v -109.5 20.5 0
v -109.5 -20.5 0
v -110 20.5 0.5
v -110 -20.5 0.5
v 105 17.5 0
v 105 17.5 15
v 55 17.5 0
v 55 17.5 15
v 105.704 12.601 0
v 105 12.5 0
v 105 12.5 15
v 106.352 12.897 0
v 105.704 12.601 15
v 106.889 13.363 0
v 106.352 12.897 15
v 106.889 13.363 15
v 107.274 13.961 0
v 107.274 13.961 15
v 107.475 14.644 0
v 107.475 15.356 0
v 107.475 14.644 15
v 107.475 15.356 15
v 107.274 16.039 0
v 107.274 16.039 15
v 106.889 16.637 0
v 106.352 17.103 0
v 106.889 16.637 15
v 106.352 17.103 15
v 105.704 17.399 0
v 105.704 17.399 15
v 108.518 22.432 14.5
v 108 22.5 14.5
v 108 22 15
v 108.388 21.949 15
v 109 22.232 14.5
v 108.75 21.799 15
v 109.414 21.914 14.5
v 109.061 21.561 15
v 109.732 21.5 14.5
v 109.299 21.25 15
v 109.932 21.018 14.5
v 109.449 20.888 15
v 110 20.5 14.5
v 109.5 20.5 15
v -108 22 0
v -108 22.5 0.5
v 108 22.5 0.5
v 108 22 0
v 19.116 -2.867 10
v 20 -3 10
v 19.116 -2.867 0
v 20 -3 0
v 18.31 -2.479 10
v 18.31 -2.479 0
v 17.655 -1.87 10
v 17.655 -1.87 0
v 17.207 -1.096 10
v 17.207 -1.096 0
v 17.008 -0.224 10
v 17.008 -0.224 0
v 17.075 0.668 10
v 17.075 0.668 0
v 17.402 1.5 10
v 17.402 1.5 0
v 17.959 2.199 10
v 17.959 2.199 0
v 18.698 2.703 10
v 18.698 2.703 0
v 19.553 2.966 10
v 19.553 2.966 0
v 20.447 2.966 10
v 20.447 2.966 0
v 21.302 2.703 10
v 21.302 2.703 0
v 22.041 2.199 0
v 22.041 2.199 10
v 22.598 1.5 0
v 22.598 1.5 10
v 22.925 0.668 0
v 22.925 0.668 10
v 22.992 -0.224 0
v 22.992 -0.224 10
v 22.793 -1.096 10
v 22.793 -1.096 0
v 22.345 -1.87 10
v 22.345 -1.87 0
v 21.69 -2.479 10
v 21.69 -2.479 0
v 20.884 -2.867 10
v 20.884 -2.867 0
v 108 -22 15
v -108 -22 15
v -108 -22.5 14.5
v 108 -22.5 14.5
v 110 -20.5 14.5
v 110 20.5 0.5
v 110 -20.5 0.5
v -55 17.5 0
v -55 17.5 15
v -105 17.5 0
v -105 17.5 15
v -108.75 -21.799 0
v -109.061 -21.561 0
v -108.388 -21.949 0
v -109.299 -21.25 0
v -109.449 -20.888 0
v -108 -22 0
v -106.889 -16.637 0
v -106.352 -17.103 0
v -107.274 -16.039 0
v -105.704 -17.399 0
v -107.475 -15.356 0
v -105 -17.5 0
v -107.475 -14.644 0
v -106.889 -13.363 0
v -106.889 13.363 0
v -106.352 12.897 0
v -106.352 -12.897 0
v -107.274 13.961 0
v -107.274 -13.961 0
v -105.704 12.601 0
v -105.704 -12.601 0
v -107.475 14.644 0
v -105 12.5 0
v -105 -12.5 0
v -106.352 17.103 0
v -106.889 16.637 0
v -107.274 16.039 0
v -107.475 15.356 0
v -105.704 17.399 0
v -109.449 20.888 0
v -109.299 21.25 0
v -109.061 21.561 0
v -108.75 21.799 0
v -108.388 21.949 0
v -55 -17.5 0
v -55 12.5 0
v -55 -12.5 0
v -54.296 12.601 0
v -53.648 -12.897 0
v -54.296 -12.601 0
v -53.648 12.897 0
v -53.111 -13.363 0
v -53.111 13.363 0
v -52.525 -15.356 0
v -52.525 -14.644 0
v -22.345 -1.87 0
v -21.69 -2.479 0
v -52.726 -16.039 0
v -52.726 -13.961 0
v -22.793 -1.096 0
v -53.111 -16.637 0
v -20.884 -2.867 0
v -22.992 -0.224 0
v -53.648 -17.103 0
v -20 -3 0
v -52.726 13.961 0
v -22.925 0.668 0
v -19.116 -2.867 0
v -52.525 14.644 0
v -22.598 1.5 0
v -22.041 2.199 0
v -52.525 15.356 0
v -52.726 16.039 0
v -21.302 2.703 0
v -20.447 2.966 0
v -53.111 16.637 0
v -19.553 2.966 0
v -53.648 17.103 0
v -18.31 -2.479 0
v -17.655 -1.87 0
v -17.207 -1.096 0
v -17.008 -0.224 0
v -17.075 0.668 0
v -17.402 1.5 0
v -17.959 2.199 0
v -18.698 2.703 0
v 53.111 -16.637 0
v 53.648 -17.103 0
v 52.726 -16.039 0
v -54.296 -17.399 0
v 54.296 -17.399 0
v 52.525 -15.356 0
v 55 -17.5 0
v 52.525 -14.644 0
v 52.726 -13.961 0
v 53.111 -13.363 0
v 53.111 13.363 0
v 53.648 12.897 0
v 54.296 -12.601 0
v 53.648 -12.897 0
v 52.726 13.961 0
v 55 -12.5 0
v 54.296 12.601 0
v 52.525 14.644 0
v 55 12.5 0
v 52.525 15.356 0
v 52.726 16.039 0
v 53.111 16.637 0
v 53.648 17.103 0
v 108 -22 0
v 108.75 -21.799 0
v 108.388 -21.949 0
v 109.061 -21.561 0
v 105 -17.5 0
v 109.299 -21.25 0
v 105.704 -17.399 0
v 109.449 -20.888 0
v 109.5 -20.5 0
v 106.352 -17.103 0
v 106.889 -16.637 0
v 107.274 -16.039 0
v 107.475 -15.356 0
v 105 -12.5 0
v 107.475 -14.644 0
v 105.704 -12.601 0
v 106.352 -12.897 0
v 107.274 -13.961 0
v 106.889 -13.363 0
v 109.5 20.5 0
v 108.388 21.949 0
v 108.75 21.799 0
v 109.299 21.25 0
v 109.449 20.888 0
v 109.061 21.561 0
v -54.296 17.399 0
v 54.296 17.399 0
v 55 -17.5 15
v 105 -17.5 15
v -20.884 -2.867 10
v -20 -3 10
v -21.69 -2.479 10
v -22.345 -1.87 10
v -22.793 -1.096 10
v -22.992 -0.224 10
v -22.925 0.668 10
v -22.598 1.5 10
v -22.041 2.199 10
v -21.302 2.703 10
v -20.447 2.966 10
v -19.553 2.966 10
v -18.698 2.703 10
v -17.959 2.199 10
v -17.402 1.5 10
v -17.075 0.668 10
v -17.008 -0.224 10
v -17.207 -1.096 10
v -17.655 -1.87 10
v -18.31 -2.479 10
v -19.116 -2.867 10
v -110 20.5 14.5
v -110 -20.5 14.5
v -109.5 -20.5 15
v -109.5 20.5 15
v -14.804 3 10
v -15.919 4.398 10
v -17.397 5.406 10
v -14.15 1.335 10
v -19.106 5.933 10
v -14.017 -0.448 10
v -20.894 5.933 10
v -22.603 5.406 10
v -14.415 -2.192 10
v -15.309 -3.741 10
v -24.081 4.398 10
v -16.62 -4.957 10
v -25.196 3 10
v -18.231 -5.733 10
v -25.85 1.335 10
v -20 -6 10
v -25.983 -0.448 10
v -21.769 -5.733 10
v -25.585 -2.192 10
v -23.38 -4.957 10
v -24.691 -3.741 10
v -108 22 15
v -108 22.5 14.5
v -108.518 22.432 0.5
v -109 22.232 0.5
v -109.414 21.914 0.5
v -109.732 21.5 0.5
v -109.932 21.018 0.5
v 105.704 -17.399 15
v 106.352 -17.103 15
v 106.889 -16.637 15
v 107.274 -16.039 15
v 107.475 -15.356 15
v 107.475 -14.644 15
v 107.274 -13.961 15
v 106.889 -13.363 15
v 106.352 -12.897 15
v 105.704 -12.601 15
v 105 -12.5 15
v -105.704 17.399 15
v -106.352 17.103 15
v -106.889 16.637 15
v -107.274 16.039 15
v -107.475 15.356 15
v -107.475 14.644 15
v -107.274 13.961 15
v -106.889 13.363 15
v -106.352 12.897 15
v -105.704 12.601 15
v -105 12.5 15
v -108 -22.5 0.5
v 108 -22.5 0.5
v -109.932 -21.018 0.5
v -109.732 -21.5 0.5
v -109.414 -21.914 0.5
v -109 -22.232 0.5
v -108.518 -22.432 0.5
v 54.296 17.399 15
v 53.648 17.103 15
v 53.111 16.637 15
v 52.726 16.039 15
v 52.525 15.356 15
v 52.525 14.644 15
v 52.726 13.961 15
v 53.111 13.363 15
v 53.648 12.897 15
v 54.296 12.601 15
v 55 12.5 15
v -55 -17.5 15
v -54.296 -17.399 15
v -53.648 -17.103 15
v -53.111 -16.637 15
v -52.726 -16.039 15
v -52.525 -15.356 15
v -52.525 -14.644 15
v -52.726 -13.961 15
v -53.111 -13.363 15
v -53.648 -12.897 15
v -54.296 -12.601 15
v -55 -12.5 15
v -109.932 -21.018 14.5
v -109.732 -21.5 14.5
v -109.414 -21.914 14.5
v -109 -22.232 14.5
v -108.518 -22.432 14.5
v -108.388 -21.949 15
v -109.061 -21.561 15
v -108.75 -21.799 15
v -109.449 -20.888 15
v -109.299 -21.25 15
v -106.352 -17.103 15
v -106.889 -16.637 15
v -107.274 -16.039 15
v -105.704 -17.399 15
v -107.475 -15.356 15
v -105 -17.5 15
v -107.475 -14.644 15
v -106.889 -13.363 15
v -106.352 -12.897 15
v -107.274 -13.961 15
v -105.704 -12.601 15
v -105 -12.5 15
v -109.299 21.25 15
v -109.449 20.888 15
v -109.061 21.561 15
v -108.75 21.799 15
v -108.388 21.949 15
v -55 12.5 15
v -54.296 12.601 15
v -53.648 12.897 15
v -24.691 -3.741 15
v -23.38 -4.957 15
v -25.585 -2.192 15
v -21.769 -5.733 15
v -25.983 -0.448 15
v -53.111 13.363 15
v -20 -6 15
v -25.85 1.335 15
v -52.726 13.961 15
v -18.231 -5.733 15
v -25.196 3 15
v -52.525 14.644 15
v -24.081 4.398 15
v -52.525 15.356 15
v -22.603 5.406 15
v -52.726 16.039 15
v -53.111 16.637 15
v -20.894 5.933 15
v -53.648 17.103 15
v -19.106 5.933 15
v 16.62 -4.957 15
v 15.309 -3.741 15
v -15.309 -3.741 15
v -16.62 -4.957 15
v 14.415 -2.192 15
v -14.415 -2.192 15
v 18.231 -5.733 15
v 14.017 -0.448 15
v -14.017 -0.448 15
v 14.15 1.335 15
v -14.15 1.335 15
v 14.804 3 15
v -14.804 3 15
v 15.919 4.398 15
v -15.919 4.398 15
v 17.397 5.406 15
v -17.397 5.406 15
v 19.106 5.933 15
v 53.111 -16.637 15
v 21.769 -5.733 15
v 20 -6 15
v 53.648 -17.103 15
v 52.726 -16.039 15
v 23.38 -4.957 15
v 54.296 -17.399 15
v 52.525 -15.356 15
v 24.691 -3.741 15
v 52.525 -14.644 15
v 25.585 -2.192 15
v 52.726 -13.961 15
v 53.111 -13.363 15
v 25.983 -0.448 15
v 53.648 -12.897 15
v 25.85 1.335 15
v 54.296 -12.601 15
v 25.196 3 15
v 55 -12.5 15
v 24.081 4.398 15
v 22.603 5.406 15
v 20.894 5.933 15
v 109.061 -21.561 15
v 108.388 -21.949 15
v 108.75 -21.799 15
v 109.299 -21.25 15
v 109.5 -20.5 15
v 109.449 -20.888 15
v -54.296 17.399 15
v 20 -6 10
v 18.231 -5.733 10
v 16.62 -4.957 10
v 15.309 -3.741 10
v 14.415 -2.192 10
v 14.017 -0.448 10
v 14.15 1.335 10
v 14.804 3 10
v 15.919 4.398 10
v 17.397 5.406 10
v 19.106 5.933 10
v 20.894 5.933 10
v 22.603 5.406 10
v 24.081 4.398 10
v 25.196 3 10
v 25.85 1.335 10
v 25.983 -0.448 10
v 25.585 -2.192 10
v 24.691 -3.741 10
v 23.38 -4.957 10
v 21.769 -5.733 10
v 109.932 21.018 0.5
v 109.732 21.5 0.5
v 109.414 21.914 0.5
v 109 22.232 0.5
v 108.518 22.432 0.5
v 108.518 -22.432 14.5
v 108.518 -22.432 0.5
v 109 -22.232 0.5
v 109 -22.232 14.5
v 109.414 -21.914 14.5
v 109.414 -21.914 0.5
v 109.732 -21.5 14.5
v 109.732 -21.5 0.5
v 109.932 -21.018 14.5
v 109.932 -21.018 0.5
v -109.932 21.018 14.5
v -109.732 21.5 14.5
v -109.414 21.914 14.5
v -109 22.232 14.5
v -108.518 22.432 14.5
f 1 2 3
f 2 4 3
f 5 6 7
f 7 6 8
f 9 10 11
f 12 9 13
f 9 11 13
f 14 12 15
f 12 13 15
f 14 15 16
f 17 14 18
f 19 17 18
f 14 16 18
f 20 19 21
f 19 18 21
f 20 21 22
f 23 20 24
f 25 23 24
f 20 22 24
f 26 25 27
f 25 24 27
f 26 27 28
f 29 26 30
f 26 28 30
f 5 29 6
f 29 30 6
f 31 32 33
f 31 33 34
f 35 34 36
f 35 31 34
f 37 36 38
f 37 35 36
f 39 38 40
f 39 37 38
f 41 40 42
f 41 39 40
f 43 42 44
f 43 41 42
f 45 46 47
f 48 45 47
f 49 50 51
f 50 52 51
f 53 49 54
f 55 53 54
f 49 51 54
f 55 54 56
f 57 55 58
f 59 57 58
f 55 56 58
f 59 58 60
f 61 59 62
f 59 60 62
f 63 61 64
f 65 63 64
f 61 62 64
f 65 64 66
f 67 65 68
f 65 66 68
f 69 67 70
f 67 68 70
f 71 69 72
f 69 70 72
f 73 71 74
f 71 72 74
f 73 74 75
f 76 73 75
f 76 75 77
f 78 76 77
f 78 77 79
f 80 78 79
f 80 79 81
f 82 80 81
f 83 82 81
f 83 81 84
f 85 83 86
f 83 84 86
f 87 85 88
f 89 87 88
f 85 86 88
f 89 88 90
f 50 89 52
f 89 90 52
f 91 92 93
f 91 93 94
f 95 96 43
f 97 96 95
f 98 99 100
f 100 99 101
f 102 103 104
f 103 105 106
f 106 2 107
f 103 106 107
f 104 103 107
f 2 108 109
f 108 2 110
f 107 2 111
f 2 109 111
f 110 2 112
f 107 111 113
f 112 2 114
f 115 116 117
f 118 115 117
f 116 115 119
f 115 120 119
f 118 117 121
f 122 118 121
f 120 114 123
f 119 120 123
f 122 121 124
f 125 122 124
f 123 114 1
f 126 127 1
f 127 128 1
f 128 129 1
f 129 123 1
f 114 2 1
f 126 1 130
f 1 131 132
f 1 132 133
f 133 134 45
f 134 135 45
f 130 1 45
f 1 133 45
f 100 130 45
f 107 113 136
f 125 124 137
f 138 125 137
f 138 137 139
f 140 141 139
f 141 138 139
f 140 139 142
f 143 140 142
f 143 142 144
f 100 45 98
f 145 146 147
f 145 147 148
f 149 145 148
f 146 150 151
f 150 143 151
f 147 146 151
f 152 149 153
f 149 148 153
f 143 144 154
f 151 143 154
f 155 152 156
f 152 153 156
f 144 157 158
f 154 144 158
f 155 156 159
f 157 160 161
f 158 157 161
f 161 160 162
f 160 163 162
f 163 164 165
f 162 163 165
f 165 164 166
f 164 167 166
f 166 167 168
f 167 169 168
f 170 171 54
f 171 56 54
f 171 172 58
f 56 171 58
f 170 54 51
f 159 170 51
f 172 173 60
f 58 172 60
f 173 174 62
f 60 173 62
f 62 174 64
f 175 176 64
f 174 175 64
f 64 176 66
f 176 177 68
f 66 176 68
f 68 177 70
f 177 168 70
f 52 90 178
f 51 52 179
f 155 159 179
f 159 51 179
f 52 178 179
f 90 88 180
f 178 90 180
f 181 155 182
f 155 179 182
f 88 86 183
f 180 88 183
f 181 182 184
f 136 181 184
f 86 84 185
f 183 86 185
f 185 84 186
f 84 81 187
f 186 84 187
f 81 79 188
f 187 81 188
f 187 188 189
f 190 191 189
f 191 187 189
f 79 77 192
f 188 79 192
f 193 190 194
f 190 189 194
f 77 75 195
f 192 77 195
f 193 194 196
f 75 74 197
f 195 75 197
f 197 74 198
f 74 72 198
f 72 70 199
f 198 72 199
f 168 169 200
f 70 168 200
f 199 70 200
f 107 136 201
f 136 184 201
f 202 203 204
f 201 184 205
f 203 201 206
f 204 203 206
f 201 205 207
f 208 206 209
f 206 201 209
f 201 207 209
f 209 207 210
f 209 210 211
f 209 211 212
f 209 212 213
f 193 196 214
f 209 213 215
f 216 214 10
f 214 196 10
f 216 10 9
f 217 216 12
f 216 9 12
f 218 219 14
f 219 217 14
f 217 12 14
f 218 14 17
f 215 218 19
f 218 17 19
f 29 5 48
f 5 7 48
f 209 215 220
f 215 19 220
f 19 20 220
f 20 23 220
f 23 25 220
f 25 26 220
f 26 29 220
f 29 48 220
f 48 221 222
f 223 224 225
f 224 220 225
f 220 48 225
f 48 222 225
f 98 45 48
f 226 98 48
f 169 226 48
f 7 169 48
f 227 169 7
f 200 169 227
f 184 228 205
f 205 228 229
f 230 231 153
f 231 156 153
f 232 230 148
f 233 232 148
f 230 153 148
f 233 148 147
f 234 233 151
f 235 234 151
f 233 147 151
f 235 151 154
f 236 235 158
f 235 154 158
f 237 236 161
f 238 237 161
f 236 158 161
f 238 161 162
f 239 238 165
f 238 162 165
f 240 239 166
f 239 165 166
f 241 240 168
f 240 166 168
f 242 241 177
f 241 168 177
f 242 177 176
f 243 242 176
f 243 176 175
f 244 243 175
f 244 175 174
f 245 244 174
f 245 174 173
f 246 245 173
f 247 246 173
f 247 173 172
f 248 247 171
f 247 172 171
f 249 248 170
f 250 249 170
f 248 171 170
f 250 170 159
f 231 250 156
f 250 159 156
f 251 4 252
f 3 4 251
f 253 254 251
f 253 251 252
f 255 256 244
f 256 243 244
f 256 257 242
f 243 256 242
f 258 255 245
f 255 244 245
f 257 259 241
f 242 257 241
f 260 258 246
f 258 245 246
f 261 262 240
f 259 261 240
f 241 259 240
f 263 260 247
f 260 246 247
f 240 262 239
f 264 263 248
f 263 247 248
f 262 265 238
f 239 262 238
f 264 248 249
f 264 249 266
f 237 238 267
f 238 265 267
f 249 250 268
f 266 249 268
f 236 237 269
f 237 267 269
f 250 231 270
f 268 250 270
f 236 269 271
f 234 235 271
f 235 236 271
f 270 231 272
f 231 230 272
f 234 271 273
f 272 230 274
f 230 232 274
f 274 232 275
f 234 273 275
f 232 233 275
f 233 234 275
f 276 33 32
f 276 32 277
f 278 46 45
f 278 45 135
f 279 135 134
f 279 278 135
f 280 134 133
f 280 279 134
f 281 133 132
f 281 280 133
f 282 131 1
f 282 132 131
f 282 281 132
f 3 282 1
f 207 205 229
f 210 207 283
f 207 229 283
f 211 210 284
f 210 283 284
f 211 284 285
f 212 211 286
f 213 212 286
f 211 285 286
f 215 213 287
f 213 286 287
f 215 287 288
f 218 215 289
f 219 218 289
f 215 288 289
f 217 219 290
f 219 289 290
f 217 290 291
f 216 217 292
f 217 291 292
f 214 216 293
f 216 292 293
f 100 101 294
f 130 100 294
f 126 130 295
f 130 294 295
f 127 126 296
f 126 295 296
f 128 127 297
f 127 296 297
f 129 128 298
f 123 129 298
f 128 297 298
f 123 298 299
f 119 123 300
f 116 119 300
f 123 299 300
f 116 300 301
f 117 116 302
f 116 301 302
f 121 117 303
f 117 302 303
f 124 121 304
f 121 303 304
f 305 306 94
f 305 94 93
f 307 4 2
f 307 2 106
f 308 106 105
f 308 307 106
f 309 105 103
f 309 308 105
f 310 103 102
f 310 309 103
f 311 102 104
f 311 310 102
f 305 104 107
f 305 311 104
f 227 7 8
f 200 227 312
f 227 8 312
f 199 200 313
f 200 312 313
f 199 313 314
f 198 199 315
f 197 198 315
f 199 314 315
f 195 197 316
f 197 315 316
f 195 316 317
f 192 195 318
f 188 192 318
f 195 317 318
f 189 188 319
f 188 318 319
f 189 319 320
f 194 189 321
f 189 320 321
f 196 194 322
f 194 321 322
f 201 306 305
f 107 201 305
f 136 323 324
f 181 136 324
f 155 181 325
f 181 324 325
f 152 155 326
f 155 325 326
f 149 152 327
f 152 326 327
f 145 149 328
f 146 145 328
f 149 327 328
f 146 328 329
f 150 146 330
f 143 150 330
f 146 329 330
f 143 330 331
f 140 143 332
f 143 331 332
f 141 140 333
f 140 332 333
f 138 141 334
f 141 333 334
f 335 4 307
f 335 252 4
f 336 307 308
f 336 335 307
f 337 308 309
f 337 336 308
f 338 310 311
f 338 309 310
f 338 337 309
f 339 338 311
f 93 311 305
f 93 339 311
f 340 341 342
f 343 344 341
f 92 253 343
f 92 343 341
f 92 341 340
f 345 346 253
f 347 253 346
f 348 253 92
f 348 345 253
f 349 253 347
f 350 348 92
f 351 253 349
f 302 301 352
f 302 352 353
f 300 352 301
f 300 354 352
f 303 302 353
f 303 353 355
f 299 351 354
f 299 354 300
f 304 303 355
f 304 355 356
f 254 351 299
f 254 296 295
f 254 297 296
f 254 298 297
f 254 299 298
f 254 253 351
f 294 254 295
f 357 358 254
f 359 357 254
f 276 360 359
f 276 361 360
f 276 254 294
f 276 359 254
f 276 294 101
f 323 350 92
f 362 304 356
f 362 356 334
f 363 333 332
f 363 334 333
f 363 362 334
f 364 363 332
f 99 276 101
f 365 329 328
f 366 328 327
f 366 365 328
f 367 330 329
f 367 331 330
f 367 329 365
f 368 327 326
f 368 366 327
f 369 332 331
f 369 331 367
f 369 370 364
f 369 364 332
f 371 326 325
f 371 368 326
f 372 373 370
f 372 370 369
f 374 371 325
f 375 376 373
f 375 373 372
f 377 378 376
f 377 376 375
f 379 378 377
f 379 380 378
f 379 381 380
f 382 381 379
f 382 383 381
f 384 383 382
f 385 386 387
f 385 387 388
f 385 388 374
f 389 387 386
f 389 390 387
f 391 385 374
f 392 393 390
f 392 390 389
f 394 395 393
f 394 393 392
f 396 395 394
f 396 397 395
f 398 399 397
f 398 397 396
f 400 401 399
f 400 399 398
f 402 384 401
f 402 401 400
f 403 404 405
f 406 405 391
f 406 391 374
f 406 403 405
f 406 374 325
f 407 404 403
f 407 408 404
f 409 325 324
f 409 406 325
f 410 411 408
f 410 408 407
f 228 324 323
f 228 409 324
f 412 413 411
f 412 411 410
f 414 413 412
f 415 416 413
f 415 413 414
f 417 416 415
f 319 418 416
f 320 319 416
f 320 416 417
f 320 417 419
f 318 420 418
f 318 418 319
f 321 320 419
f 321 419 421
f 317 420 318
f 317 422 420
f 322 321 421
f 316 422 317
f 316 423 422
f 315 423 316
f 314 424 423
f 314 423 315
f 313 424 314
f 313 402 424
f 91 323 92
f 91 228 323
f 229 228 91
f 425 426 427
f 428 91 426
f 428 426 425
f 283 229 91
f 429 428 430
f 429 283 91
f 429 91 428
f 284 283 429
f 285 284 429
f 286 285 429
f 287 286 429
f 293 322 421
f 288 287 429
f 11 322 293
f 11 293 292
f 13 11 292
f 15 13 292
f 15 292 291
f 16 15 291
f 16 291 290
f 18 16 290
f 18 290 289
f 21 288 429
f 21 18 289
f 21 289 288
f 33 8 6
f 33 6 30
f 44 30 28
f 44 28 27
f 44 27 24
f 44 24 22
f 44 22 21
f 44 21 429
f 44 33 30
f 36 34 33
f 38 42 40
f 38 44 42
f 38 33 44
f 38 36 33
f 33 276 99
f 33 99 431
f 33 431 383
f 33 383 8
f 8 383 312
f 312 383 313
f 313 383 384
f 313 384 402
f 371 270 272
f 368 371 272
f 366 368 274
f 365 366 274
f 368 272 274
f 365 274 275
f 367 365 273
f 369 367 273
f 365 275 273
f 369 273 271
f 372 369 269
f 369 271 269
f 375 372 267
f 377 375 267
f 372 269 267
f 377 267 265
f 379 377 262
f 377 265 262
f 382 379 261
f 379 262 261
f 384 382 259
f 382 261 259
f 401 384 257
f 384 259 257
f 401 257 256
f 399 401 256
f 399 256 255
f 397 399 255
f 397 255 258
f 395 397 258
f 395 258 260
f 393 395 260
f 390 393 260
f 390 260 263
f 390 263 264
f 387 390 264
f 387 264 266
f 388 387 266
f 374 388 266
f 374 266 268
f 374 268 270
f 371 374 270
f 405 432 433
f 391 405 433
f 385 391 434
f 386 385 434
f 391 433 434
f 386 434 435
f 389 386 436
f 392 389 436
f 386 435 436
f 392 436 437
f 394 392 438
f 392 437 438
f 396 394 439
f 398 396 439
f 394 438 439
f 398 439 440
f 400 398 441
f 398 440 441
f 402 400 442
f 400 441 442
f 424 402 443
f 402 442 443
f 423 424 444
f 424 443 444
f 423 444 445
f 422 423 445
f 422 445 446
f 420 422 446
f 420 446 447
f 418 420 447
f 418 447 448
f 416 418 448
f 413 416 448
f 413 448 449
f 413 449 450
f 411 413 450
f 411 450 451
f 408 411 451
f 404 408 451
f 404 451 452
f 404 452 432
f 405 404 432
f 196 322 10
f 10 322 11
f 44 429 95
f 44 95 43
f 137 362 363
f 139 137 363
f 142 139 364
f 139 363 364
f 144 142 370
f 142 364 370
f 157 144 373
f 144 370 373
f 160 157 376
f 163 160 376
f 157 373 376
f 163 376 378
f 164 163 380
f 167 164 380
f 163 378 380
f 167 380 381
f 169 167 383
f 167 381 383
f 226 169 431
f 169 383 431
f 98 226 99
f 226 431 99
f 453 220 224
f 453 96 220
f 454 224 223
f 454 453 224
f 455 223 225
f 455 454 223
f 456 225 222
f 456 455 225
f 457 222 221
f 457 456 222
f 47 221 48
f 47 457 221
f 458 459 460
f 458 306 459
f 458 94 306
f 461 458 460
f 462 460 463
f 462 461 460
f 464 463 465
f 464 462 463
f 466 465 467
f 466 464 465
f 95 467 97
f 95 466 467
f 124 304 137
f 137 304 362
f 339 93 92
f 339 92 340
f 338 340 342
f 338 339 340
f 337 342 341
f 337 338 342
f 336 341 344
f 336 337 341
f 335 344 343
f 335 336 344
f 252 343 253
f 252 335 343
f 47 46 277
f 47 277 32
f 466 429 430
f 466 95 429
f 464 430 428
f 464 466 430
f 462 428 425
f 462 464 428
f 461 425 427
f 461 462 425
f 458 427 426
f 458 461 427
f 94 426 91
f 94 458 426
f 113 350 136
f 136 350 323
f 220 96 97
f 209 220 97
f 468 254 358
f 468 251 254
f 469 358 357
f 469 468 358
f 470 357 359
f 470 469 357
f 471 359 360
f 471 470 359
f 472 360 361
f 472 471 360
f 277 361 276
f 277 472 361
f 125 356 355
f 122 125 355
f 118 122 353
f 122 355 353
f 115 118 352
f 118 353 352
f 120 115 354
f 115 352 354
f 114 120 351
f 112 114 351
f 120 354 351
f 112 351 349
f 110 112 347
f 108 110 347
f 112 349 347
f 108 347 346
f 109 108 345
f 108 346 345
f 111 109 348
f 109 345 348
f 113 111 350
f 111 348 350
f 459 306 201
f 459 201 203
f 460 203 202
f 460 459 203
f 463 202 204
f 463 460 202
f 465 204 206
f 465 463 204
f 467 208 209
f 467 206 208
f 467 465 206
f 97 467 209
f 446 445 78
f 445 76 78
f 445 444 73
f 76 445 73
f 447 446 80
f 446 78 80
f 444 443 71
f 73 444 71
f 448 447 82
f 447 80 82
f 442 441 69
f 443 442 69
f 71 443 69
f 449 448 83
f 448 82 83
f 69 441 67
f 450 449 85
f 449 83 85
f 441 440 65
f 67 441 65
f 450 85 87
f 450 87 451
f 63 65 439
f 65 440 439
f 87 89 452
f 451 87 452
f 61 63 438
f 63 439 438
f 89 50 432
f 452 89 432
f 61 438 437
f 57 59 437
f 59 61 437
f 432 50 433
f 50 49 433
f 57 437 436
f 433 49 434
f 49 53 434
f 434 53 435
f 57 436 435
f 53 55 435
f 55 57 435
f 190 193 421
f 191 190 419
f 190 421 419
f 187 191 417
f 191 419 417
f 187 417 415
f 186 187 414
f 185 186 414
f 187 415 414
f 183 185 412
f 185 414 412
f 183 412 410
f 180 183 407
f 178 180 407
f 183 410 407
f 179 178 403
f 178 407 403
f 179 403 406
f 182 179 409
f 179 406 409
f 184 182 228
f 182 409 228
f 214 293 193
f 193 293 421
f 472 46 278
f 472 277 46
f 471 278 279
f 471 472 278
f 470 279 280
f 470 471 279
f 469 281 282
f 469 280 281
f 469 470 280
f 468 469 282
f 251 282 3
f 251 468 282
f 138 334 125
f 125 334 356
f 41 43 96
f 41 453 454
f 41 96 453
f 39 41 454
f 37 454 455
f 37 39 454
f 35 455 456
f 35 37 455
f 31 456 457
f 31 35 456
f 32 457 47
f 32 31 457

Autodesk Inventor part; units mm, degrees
ref_plane "YZ Plane" through (0, 0, 0) normal (1, 0, 0) x (0, 1, 0)
ref_plane "XZ Plane" through (0, 0, 0) normal (0, 1, 0) x (-1, 0, 0)
ref_plane "XY Plane" through (0, 0, 0) normal (0, 0, 1) x (1, 0, 0)
sketch "Sketch1" plane through (0, 0, 0) normal (0, 0, 1) x (1, 0, 0)
  line L0 (-110, 22.5) -> (110, 22.5)
  line L1 (110, 22.5) -> (110, -22.5)
  line L2 (110, -22.5) -> (-110, -22.5)
  line L3 (-110, -22.5) -> (-110, 22.5)
  point P0 (0, 0)
  point P1 (110, 0)
  point P2 (0, 22.5)
  dimension "d0" = 220
  dimension "d1" = 45
extrude "Extrusion1" add sketch "Sketch1" along normal blind 15
sketch "Sketch2" plane through (0, 0, 15) normal (0, 0, 1) x (1, 0, 0)
  line L0 (-105, 15) -> (-55, 15) construction
  line L1 (-105, 12.5) -> (-55, 12.5)
  line L2 (-55, 17.5) -> (-105, 17.5)
  arc A0 (-105, 17.5) -> (-105, 12.5) centre (-105, 15) ccw
  arc A1 (-55, 12.5) -> (-55, 17.5) centre (-55, 15) ccw
  line L3 (-105, -15) -> (-55, -15) construction
  line L4 (-105, -17.5) -> (-55, -17.5)
  line L5 (-55, -12.5) -> (-105, -12.5)
  arc A2 (-105, -12.5) -> (-105, -17.5) centre (-105, -15) ccw
  arc A3 (-55, -17.5) -> (-55, -12.5) centre (-55, -15) ccw
  line L6 (-80, 15) -> (-80, -15) construction
  line L7 (-110, 22.5) -> (-110, -22.5) projected
  point P0 (0, 0)
  point P1 (-80, 0)
  dimension "d4" = 5
  dimension "d5" = 30
  dimension "d6" = 50
  dimension "d7" = 5
extrude "Extrusion2" cut sketch "Sketch2" against normal through all
mirror "Mirror1" about plane through (0, 0, 0) normal (1, 0, 0) of "Extrusion2"
fillet "Fillet1" radius 2 4 edges at (-110, -22.5, 7.5) (-110, 22.5, 7.5) (110, 22.5, 7.5) (110, -22.5, 7.5)
chamfer "Chamfer1" distance 0.5 angle 45 16 edges at (0, 22.5, 15) (-109.4142, 21.9142, 15) (-110, 0, 15) (-109.4142, -21.9142, 15) (0, -22.5, 15) (109.4142, -21.9142, 15) (110, 0, 15) (109.4142, 21.9142, 15) (0, -22.5, 0) (109.4142, -21.9142, 0) (110, 0, 0) (109.4142, 21.9142, 0) (0, 22.5, 0) (-109.4142, 21.9142, 0) (-110, 0, 0) (-109.4142, -21.9142, 0)
sketch "Sketch3" plane through (0, 0, 15) normal (0, 0, -1) x (-1, 0, 0)
  line L0 (-20, 0) -> (20, 0) construction
  point P0 (0, 0)
  point P1 (0, 0)
  dimension "d14" = 40
hole "Hole1" at (20, 0, 15) at (-20, 0, 15) direction (0, 0, -1) diameter 6 end through all counterbore diameter 12 counterbore depth 5
properties part number "clamp-foot" material "Aluminum 6061"
